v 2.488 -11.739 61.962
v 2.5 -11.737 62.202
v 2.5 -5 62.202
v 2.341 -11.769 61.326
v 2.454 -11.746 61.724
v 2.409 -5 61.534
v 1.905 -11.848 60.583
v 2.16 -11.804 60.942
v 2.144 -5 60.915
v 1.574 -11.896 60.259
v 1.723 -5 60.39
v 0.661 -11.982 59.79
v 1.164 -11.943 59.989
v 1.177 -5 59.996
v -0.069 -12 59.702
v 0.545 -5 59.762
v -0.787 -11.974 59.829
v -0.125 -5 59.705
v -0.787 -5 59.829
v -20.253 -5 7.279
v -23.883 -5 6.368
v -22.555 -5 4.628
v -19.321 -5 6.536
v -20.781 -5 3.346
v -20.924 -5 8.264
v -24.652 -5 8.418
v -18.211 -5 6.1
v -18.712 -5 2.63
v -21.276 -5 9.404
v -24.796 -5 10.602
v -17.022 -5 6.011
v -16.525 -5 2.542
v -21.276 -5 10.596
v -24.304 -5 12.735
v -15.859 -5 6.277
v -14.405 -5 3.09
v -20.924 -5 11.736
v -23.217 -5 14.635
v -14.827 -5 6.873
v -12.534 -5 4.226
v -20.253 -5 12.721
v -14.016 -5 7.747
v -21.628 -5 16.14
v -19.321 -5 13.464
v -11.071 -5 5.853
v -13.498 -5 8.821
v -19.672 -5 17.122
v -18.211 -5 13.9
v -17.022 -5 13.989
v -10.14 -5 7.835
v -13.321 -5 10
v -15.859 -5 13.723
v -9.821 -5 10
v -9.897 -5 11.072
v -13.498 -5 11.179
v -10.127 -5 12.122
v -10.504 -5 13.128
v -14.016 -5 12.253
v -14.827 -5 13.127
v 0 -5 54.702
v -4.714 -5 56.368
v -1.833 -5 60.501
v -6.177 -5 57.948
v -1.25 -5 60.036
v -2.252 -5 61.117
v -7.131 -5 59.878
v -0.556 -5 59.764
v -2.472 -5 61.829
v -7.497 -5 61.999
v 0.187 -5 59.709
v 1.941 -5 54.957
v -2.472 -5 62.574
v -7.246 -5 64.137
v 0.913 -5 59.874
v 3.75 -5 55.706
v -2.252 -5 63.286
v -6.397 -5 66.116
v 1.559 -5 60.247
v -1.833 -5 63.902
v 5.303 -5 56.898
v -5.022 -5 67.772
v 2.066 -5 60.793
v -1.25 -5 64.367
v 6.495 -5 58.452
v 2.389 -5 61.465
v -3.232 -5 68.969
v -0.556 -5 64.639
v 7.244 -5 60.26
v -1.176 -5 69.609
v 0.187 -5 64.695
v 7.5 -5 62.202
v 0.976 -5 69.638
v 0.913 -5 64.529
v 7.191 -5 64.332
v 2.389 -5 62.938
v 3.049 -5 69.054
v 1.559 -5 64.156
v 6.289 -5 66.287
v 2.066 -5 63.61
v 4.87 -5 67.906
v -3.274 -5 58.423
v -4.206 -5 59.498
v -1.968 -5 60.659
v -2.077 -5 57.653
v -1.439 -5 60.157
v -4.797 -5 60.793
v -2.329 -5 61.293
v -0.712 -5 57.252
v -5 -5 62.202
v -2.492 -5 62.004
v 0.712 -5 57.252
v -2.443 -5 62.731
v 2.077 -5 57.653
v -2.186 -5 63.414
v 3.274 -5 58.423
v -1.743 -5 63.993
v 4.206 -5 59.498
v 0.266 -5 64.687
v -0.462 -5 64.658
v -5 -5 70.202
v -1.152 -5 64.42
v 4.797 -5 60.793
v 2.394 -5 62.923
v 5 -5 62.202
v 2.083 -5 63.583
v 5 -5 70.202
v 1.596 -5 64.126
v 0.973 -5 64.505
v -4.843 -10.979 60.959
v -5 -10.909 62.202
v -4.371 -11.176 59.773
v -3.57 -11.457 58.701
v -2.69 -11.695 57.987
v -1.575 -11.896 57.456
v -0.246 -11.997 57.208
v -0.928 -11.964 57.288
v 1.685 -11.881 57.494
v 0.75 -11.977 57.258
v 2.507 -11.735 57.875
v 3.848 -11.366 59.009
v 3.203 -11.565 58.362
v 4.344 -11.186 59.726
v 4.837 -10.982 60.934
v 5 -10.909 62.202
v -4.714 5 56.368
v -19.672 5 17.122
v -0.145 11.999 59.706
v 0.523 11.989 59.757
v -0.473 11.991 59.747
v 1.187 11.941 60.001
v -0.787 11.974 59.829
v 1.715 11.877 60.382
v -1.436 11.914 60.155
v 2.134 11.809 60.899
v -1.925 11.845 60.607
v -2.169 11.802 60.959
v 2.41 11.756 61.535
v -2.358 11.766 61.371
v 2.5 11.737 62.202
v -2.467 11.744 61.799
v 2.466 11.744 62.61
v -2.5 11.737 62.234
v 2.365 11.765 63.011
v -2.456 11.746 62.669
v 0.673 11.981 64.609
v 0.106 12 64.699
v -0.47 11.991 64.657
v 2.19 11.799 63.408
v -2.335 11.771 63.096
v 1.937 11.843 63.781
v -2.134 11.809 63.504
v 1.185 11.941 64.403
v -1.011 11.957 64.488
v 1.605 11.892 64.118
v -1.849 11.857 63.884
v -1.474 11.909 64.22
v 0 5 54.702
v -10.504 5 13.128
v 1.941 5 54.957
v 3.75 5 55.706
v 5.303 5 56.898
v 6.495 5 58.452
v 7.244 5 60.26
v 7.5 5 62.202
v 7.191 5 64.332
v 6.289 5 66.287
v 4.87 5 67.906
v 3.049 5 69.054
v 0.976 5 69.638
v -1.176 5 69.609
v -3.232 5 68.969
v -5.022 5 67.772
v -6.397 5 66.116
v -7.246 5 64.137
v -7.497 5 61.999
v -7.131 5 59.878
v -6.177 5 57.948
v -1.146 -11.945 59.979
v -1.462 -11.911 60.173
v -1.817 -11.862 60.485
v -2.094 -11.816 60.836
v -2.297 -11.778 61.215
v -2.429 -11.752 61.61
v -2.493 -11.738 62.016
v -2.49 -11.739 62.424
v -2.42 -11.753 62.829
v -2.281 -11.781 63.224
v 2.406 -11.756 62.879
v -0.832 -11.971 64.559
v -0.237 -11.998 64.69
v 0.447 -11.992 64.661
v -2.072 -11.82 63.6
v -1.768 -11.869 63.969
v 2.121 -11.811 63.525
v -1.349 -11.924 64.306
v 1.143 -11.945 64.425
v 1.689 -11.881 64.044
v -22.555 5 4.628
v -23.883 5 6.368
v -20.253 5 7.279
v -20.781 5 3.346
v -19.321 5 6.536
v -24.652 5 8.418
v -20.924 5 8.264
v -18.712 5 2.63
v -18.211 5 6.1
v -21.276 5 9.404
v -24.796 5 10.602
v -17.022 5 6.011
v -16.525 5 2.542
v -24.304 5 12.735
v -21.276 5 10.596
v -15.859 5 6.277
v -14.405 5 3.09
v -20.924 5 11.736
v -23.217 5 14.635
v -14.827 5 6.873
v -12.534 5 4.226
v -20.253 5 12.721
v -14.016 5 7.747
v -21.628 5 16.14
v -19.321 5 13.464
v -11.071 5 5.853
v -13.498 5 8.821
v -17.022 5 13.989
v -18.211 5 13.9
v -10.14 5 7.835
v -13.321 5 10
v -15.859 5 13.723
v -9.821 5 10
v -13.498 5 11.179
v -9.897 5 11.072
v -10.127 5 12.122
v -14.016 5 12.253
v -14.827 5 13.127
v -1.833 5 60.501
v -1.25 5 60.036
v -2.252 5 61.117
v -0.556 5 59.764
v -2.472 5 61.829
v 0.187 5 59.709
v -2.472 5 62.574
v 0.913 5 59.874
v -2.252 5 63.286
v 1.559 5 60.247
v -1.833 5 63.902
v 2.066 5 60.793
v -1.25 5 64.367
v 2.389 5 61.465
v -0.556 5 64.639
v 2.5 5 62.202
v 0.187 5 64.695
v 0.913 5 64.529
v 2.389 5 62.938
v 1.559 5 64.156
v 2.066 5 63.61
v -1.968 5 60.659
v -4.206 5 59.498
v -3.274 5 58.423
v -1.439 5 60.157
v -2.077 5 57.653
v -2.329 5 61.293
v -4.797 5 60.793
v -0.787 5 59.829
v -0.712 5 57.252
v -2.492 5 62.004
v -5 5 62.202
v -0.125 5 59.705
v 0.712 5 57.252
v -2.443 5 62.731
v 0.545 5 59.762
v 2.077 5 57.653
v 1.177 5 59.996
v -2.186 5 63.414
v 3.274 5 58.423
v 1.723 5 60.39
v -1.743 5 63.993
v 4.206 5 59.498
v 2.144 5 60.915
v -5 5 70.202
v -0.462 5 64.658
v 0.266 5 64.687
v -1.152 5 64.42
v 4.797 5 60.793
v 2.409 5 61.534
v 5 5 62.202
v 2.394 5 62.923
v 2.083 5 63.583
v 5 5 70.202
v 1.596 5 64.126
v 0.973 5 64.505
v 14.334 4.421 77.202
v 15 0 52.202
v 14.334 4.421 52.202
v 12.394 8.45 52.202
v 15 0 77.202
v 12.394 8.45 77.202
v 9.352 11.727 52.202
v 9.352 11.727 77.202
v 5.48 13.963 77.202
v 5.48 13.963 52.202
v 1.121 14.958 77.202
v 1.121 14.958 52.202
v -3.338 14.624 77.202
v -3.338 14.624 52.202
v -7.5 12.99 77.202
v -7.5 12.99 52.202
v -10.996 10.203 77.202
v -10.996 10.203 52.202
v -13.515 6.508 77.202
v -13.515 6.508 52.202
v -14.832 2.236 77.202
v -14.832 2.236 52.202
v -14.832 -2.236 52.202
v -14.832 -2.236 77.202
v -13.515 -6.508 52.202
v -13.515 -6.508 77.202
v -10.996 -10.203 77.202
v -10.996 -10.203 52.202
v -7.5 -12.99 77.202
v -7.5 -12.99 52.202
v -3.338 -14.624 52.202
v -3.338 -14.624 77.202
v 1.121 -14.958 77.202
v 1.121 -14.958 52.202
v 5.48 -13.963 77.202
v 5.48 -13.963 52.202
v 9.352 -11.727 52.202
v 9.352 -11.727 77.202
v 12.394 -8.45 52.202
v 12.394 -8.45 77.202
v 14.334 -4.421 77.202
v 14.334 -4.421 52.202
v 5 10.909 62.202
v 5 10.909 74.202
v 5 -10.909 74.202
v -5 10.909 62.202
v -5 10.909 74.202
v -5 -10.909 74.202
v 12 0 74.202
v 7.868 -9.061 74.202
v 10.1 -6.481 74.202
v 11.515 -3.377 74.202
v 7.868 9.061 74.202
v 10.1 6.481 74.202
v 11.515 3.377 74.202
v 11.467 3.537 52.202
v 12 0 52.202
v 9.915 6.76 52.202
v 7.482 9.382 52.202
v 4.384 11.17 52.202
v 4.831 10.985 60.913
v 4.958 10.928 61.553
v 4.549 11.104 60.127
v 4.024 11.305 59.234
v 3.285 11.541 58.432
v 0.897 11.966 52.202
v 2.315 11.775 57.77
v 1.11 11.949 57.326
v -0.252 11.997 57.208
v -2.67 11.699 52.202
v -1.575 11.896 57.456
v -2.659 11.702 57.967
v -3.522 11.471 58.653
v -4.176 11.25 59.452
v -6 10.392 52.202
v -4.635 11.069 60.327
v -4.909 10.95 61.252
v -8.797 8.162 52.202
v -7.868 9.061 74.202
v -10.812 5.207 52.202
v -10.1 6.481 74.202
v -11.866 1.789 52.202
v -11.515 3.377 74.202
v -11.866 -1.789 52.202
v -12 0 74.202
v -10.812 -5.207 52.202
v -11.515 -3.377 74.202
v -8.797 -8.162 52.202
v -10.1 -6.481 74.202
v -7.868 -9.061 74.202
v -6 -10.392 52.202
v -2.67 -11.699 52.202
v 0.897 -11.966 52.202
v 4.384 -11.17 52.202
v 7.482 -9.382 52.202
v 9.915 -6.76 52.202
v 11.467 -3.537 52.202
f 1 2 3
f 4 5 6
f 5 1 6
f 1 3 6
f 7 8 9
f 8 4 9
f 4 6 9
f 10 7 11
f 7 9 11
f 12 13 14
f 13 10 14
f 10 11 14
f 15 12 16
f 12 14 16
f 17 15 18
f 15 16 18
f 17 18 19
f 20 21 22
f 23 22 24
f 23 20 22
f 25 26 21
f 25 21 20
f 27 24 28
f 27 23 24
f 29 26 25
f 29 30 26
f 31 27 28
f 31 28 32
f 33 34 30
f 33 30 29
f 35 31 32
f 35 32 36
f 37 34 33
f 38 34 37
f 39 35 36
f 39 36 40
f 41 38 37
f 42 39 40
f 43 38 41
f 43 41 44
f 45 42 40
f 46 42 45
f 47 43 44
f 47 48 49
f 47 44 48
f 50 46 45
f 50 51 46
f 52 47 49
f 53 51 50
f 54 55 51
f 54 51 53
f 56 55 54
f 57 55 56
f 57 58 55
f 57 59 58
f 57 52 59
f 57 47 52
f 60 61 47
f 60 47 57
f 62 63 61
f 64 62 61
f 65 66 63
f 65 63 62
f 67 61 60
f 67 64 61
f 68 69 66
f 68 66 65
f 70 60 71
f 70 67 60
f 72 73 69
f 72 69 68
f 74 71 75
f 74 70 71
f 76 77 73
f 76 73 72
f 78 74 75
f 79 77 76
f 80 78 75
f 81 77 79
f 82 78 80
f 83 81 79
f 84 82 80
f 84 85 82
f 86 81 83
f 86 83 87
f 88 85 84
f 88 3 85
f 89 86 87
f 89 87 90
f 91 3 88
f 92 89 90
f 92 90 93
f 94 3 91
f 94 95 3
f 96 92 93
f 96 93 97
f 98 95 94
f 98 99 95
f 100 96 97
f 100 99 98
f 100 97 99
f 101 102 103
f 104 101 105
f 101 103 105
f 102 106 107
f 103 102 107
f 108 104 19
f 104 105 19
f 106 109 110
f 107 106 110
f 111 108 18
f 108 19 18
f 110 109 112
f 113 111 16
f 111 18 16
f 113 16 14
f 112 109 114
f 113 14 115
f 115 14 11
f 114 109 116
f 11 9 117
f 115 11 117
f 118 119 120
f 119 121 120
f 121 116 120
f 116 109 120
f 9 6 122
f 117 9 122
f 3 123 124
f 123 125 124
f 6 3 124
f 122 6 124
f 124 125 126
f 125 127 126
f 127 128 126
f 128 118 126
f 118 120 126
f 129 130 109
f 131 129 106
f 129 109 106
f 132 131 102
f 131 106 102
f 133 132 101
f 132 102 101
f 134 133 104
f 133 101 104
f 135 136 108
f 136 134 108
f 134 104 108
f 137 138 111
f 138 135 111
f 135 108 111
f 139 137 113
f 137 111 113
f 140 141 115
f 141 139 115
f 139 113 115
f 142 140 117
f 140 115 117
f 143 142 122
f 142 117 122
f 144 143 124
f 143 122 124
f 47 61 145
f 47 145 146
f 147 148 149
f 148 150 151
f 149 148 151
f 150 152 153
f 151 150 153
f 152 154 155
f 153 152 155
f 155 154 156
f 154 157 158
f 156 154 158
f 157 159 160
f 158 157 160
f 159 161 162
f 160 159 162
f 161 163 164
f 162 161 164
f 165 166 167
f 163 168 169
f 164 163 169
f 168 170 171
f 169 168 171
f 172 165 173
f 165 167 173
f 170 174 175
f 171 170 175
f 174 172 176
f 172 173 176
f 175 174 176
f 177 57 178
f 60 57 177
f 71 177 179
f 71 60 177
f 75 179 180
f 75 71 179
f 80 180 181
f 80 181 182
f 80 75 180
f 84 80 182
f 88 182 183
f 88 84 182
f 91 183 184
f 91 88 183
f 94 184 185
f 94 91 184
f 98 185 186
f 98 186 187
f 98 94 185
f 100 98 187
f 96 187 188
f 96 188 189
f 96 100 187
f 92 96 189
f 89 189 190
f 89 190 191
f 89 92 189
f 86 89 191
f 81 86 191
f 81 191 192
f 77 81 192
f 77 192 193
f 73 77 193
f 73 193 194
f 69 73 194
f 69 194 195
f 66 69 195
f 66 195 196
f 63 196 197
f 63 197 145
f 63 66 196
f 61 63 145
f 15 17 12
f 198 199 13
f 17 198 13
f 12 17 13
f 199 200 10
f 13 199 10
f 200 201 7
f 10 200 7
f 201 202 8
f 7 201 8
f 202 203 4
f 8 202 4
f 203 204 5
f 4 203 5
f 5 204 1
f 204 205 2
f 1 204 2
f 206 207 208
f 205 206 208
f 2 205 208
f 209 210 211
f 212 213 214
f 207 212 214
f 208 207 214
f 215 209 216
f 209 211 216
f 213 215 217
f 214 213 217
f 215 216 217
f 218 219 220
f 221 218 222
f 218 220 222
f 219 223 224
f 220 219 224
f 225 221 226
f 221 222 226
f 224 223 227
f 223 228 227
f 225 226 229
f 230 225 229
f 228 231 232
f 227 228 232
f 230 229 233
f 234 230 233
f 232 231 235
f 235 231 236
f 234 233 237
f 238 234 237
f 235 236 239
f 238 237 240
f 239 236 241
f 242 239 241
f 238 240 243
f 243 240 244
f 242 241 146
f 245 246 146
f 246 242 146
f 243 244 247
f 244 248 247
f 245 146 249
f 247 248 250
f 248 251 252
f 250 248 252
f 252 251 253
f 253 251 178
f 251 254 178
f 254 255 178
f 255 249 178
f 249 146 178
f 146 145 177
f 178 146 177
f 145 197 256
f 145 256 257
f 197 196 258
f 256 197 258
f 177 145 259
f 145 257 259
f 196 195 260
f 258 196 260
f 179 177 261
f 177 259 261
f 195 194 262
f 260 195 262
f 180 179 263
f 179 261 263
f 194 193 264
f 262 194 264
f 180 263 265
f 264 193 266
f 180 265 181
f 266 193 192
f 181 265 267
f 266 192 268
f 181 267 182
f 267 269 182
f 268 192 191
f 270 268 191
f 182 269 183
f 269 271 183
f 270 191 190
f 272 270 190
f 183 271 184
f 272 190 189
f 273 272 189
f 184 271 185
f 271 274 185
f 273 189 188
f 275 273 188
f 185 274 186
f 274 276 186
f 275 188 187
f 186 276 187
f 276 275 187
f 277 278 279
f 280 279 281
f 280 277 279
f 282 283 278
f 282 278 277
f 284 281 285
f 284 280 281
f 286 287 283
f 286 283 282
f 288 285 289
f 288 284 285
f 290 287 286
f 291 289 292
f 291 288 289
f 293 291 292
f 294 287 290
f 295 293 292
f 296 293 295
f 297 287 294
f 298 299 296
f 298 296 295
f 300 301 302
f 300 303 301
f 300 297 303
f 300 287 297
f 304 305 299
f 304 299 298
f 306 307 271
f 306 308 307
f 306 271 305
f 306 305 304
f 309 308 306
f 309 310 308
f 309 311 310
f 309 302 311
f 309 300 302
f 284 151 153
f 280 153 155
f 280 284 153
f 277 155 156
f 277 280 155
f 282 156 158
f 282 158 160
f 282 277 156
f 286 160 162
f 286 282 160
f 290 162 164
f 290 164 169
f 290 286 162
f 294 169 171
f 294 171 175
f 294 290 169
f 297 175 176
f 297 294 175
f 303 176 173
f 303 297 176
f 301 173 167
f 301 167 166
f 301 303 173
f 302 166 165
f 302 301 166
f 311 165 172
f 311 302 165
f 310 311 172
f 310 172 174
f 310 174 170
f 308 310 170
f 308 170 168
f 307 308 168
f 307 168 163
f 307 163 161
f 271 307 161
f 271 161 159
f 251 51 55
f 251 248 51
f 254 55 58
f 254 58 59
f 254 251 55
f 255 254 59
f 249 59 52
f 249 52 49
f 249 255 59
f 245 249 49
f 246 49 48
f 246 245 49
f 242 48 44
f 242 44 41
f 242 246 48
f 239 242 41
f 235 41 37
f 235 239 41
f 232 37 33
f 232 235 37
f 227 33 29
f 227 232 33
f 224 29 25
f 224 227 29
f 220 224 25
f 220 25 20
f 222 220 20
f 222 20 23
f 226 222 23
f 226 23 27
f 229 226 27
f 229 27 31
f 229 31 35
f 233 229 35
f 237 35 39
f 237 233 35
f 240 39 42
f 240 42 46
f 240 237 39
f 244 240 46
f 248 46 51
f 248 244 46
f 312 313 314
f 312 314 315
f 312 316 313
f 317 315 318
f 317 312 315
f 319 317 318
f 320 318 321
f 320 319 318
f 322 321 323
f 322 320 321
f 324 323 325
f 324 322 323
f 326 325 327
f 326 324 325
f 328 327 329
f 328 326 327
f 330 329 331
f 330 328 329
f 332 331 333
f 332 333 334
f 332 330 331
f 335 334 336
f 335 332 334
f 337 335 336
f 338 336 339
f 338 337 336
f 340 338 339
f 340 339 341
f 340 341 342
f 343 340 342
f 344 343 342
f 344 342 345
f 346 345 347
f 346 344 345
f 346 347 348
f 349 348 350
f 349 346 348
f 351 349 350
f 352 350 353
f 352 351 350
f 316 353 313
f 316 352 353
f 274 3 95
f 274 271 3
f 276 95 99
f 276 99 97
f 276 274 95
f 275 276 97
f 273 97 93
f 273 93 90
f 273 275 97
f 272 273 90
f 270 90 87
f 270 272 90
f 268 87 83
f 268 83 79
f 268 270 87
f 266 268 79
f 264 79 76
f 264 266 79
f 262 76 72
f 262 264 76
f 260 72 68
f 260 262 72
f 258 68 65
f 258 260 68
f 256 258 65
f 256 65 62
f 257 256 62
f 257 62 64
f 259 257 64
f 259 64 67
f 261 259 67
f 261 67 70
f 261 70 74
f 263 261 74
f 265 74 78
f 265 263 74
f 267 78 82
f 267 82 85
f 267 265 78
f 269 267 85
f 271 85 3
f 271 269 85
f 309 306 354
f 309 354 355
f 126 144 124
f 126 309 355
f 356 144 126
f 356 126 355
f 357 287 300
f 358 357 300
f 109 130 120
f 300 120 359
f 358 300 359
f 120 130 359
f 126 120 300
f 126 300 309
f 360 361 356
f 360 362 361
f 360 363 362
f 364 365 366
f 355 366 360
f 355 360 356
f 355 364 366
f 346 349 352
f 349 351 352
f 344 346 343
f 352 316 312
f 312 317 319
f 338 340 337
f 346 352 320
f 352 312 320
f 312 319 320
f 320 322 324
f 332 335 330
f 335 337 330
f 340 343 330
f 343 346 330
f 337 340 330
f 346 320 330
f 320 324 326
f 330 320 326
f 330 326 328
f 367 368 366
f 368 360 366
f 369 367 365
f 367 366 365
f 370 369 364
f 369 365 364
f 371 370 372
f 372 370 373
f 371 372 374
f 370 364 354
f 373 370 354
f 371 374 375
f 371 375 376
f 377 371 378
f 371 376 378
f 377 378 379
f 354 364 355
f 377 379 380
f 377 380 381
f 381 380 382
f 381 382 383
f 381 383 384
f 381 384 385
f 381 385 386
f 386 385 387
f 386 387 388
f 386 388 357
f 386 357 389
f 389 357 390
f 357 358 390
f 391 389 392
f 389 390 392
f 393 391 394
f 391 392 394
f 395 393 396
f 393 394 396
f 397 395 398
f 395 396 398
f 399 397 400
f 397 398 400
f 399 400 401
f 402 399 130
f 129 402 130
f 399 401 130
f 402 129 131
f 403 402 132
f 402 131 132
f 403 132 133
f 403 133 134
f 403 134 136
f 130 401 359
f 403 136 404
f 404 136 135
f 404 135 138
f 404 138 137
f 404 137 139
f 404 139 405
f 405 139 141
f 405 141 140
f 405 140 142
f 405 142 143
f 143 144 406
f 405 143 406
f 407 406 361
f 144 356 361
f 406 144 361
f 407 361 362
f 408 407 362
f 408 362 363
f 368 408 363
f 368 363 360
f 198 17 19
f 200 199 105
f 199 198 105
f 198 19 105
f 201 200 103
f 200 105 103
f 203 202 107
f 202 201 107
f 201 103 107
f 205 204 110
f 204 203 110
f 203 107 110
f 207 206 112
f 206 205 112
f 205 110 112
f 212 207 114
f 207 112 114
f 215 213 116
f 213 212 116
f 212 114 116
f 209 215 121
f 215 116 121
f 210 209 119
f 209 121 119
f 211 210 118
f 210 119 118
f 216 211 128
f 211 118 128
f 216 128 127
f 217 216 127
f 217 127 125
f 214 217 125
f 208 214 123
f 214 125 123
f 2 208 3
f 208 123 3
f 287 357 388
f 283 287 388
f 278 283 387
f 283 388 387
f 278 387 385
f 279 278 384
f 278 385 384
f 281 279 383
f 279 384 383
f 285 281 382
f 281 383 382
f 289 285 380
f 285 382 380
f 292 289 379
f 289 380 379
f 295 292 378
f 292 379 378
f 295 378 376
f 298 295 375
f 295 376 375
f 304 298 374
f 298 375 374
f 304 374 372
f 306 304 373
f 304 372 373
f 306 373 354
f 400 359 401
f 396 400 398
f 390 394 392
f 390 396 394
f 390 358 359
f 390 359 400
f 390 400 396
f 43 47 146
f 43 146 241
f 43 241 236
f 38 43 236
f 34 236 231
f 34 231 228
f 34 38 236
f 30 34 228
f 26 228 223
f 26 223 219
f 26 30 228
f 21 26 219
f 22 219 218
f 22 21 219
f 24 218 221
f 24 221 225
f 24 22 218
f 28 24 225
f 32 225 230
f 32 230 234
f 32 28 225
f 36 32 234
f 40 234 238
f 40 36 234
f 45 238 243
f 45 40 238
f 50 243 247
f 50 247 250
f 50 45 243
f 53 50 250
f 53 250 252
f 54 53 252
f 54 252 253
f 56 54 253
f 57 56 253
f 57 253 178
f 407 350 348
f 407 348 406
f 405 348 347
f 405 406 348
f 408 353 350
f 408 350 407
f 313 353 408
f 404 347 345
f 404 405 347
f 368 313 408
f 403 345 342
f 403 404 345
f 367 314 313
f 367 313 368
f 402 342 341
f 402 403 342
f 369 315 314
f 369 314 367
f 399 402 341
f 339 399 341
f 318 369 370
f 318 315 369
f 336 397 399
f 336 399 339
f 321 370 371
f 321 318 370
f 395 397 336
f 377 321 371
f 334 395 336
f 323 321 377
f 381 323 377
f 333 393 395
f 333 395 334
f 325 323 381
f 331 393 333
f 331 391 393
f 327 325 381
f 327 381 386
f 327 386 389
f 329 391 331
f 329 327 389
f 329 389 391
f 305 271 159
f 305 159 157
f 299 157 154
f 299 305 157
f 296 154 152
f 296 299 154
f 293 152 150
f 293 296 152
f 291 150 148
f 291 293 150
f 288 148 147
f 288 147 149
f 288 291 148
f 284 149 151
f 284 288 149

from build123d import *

# Parameters (mm, degrees)
F1_W          = 15
F1_H          = 25
F3_T          = -3
F4_DEPTH      = 12.0000001006
F4_DEPTH_BACK = 12.0000001006
F5_R          = 2.5
F6_DEPTH      = 5
F7_W          = 10
F7_H          = 7
F8_DEPTH      = 12
F8_DEPTH_BACK = 12
F9_R          = 2.5
F9_R_2        = 4
F10_DEPTH     = 5


with BuildPart() as f2:
    # F1 (on Front) → F2 (revolve)
    with BuildSketch(Plane.XZ):
        with Locations((7.5, 64.7015325446)):
            Rectangle(F1_W, F1_H)
    revolve(axis=Axis((0, 0, 62.2015325446), (0, 0, 1)))

    # F3
    f3_openings = [f2.faces().sort_by_distance(p)[0] for p in [
        (0, 0, 52.201533),
    ]]
    offset(amount=F3_T, openings=f3_openings)

    # F0 (on Front) → F4 (join, two sides)
    with BuildSketch(Plane.XZ) as f4_sk:
        with BuildLine():
            ThreePointArc((-5, 62.2015325446), (-4.0541927813, 59.2751831307), (-1.5745916432, 57.4559386769))
            ThreePointArc((-1.5745916432, 57.4559386769), (2.9263494138, 58.1473397632), (5, 62.2015325446))
            Line((5, 62.2015325446), (5, 70.2015325446))
            Line((5, 70.2015325446), (-5, 70.2015325446))
            Line((-5, 70.2015325446), (-5, 62.2015325446))
        make_face()
        with BuildLine():
            ThreePointArc((2.5, 62.2015325446), (1.4631747069, 60.1744361539), (-0.7872958216, 59.8287356107))
            ThreePointArc((-0.7872958216, 59.8287356107), (-1.4631747069, 64.2286289352), (2.5, 62.2015325446))
        make_face(mode=Mode.SUBTRACT)
    extrude(amount=-F4_DEPTH)
    extrude(f4_sk.sketch, amount=F4_DEPTH_BACK)

    # F5 (on Front) → F6 (cut, symmetric)
    with BuildSketch(Plane.XZ):
        with BuildLine():
            Line((5, 70.2015325446), (-5, 70.2015325446))
            Line((-5, 70.2015325446), (-5, 62.2015325446))
            ThreePointArc((-5, 62.2015325446), (0, 57.2015325446), (5, 62.2015325446))
            Line((5, 62.2015325446), (5, 70.2015325446))
        make_face()
        with Locations((0, 62.2015325446)):
            Circle(F5_R, mode=Mode.SUBTRACT)
    extrude(amount=F6_DEPTH, both=True, mode=Mode.SUBTRACT)

    # F7 (on Front) → F8 (join, two sides)
    with BuildSketch(Plane.XZ) as f8_sk:
        with Locations((0, 73.7015325446)):
            Rectangle(F7_W, F7_H)
    extrude(amount=F8_DEPTH)
    extrude(f8_sk.sketch, amount=-F8_DEPTH_BACK)


with BuildPart() as f10:
    # F9 (on Front) → F10 (new body, symmetric)
    with BuildSketch(Plane.XZ):
        with BuildLine():
            ThreePointArc((0, 54.7015325446), (5.3033008589, 56.8982316857), (7.5, 62.2015325446))
            ThreePointArc((7.5, 62.2015325446), (-3.232233047, 68.9692994975), (-4.7140452079, 56.3681992112))
            ThreePointArc((-4.7140452079, 56.3681992112), (-2.5, 55.1304647327), (0, 54.7015325446))
        make_face()
        with Locations((0, 62.2015325446)):
            Circle(F9_R, mode=Mode.SUBTRACT)
        with BuildLine():
            ThreePointArc((0, 54.7015325446), (-2.5, 55.1304647327), (-4.7140452079, 56.3681992112))
            Line((-4.7140452079, 56.3681992112), (-19.6716815341, 17.1219367709))
            ThreePointArc((-19.6716815341, 17.1219367709), (-14.325011455, 16.8758272226), (-10.5039119039, 13.1279412767))
            Line((-10.5039119039, 13.1279412767), (0, 54.7015325446))
        make_face()
        with BuildLine():
            ThreePointArc((-10.5039119039, 13.1279412767), (-14.325011455, 16.8758272226), (-19.6716815341, 17.1219367709))
            ThreePointArc((-19.6716815341, 17.1219367709), (-21.7146063371, 3.922015098), (-9.8205080757, 10))
            ThreePointArc((-9.8205080757, 10), (-9.9933506702, 11.6008636281), (-10.5039119039, 13.1279412767))
        make_face()
        with Locations((-17.3205080757, 10)):
            Circle(F9_R_2, mode=Mode.SUBTRACT)
    extrude(amount=F10_DEPTH, both=True)


solid = Compound([f2.part, f10.part])
